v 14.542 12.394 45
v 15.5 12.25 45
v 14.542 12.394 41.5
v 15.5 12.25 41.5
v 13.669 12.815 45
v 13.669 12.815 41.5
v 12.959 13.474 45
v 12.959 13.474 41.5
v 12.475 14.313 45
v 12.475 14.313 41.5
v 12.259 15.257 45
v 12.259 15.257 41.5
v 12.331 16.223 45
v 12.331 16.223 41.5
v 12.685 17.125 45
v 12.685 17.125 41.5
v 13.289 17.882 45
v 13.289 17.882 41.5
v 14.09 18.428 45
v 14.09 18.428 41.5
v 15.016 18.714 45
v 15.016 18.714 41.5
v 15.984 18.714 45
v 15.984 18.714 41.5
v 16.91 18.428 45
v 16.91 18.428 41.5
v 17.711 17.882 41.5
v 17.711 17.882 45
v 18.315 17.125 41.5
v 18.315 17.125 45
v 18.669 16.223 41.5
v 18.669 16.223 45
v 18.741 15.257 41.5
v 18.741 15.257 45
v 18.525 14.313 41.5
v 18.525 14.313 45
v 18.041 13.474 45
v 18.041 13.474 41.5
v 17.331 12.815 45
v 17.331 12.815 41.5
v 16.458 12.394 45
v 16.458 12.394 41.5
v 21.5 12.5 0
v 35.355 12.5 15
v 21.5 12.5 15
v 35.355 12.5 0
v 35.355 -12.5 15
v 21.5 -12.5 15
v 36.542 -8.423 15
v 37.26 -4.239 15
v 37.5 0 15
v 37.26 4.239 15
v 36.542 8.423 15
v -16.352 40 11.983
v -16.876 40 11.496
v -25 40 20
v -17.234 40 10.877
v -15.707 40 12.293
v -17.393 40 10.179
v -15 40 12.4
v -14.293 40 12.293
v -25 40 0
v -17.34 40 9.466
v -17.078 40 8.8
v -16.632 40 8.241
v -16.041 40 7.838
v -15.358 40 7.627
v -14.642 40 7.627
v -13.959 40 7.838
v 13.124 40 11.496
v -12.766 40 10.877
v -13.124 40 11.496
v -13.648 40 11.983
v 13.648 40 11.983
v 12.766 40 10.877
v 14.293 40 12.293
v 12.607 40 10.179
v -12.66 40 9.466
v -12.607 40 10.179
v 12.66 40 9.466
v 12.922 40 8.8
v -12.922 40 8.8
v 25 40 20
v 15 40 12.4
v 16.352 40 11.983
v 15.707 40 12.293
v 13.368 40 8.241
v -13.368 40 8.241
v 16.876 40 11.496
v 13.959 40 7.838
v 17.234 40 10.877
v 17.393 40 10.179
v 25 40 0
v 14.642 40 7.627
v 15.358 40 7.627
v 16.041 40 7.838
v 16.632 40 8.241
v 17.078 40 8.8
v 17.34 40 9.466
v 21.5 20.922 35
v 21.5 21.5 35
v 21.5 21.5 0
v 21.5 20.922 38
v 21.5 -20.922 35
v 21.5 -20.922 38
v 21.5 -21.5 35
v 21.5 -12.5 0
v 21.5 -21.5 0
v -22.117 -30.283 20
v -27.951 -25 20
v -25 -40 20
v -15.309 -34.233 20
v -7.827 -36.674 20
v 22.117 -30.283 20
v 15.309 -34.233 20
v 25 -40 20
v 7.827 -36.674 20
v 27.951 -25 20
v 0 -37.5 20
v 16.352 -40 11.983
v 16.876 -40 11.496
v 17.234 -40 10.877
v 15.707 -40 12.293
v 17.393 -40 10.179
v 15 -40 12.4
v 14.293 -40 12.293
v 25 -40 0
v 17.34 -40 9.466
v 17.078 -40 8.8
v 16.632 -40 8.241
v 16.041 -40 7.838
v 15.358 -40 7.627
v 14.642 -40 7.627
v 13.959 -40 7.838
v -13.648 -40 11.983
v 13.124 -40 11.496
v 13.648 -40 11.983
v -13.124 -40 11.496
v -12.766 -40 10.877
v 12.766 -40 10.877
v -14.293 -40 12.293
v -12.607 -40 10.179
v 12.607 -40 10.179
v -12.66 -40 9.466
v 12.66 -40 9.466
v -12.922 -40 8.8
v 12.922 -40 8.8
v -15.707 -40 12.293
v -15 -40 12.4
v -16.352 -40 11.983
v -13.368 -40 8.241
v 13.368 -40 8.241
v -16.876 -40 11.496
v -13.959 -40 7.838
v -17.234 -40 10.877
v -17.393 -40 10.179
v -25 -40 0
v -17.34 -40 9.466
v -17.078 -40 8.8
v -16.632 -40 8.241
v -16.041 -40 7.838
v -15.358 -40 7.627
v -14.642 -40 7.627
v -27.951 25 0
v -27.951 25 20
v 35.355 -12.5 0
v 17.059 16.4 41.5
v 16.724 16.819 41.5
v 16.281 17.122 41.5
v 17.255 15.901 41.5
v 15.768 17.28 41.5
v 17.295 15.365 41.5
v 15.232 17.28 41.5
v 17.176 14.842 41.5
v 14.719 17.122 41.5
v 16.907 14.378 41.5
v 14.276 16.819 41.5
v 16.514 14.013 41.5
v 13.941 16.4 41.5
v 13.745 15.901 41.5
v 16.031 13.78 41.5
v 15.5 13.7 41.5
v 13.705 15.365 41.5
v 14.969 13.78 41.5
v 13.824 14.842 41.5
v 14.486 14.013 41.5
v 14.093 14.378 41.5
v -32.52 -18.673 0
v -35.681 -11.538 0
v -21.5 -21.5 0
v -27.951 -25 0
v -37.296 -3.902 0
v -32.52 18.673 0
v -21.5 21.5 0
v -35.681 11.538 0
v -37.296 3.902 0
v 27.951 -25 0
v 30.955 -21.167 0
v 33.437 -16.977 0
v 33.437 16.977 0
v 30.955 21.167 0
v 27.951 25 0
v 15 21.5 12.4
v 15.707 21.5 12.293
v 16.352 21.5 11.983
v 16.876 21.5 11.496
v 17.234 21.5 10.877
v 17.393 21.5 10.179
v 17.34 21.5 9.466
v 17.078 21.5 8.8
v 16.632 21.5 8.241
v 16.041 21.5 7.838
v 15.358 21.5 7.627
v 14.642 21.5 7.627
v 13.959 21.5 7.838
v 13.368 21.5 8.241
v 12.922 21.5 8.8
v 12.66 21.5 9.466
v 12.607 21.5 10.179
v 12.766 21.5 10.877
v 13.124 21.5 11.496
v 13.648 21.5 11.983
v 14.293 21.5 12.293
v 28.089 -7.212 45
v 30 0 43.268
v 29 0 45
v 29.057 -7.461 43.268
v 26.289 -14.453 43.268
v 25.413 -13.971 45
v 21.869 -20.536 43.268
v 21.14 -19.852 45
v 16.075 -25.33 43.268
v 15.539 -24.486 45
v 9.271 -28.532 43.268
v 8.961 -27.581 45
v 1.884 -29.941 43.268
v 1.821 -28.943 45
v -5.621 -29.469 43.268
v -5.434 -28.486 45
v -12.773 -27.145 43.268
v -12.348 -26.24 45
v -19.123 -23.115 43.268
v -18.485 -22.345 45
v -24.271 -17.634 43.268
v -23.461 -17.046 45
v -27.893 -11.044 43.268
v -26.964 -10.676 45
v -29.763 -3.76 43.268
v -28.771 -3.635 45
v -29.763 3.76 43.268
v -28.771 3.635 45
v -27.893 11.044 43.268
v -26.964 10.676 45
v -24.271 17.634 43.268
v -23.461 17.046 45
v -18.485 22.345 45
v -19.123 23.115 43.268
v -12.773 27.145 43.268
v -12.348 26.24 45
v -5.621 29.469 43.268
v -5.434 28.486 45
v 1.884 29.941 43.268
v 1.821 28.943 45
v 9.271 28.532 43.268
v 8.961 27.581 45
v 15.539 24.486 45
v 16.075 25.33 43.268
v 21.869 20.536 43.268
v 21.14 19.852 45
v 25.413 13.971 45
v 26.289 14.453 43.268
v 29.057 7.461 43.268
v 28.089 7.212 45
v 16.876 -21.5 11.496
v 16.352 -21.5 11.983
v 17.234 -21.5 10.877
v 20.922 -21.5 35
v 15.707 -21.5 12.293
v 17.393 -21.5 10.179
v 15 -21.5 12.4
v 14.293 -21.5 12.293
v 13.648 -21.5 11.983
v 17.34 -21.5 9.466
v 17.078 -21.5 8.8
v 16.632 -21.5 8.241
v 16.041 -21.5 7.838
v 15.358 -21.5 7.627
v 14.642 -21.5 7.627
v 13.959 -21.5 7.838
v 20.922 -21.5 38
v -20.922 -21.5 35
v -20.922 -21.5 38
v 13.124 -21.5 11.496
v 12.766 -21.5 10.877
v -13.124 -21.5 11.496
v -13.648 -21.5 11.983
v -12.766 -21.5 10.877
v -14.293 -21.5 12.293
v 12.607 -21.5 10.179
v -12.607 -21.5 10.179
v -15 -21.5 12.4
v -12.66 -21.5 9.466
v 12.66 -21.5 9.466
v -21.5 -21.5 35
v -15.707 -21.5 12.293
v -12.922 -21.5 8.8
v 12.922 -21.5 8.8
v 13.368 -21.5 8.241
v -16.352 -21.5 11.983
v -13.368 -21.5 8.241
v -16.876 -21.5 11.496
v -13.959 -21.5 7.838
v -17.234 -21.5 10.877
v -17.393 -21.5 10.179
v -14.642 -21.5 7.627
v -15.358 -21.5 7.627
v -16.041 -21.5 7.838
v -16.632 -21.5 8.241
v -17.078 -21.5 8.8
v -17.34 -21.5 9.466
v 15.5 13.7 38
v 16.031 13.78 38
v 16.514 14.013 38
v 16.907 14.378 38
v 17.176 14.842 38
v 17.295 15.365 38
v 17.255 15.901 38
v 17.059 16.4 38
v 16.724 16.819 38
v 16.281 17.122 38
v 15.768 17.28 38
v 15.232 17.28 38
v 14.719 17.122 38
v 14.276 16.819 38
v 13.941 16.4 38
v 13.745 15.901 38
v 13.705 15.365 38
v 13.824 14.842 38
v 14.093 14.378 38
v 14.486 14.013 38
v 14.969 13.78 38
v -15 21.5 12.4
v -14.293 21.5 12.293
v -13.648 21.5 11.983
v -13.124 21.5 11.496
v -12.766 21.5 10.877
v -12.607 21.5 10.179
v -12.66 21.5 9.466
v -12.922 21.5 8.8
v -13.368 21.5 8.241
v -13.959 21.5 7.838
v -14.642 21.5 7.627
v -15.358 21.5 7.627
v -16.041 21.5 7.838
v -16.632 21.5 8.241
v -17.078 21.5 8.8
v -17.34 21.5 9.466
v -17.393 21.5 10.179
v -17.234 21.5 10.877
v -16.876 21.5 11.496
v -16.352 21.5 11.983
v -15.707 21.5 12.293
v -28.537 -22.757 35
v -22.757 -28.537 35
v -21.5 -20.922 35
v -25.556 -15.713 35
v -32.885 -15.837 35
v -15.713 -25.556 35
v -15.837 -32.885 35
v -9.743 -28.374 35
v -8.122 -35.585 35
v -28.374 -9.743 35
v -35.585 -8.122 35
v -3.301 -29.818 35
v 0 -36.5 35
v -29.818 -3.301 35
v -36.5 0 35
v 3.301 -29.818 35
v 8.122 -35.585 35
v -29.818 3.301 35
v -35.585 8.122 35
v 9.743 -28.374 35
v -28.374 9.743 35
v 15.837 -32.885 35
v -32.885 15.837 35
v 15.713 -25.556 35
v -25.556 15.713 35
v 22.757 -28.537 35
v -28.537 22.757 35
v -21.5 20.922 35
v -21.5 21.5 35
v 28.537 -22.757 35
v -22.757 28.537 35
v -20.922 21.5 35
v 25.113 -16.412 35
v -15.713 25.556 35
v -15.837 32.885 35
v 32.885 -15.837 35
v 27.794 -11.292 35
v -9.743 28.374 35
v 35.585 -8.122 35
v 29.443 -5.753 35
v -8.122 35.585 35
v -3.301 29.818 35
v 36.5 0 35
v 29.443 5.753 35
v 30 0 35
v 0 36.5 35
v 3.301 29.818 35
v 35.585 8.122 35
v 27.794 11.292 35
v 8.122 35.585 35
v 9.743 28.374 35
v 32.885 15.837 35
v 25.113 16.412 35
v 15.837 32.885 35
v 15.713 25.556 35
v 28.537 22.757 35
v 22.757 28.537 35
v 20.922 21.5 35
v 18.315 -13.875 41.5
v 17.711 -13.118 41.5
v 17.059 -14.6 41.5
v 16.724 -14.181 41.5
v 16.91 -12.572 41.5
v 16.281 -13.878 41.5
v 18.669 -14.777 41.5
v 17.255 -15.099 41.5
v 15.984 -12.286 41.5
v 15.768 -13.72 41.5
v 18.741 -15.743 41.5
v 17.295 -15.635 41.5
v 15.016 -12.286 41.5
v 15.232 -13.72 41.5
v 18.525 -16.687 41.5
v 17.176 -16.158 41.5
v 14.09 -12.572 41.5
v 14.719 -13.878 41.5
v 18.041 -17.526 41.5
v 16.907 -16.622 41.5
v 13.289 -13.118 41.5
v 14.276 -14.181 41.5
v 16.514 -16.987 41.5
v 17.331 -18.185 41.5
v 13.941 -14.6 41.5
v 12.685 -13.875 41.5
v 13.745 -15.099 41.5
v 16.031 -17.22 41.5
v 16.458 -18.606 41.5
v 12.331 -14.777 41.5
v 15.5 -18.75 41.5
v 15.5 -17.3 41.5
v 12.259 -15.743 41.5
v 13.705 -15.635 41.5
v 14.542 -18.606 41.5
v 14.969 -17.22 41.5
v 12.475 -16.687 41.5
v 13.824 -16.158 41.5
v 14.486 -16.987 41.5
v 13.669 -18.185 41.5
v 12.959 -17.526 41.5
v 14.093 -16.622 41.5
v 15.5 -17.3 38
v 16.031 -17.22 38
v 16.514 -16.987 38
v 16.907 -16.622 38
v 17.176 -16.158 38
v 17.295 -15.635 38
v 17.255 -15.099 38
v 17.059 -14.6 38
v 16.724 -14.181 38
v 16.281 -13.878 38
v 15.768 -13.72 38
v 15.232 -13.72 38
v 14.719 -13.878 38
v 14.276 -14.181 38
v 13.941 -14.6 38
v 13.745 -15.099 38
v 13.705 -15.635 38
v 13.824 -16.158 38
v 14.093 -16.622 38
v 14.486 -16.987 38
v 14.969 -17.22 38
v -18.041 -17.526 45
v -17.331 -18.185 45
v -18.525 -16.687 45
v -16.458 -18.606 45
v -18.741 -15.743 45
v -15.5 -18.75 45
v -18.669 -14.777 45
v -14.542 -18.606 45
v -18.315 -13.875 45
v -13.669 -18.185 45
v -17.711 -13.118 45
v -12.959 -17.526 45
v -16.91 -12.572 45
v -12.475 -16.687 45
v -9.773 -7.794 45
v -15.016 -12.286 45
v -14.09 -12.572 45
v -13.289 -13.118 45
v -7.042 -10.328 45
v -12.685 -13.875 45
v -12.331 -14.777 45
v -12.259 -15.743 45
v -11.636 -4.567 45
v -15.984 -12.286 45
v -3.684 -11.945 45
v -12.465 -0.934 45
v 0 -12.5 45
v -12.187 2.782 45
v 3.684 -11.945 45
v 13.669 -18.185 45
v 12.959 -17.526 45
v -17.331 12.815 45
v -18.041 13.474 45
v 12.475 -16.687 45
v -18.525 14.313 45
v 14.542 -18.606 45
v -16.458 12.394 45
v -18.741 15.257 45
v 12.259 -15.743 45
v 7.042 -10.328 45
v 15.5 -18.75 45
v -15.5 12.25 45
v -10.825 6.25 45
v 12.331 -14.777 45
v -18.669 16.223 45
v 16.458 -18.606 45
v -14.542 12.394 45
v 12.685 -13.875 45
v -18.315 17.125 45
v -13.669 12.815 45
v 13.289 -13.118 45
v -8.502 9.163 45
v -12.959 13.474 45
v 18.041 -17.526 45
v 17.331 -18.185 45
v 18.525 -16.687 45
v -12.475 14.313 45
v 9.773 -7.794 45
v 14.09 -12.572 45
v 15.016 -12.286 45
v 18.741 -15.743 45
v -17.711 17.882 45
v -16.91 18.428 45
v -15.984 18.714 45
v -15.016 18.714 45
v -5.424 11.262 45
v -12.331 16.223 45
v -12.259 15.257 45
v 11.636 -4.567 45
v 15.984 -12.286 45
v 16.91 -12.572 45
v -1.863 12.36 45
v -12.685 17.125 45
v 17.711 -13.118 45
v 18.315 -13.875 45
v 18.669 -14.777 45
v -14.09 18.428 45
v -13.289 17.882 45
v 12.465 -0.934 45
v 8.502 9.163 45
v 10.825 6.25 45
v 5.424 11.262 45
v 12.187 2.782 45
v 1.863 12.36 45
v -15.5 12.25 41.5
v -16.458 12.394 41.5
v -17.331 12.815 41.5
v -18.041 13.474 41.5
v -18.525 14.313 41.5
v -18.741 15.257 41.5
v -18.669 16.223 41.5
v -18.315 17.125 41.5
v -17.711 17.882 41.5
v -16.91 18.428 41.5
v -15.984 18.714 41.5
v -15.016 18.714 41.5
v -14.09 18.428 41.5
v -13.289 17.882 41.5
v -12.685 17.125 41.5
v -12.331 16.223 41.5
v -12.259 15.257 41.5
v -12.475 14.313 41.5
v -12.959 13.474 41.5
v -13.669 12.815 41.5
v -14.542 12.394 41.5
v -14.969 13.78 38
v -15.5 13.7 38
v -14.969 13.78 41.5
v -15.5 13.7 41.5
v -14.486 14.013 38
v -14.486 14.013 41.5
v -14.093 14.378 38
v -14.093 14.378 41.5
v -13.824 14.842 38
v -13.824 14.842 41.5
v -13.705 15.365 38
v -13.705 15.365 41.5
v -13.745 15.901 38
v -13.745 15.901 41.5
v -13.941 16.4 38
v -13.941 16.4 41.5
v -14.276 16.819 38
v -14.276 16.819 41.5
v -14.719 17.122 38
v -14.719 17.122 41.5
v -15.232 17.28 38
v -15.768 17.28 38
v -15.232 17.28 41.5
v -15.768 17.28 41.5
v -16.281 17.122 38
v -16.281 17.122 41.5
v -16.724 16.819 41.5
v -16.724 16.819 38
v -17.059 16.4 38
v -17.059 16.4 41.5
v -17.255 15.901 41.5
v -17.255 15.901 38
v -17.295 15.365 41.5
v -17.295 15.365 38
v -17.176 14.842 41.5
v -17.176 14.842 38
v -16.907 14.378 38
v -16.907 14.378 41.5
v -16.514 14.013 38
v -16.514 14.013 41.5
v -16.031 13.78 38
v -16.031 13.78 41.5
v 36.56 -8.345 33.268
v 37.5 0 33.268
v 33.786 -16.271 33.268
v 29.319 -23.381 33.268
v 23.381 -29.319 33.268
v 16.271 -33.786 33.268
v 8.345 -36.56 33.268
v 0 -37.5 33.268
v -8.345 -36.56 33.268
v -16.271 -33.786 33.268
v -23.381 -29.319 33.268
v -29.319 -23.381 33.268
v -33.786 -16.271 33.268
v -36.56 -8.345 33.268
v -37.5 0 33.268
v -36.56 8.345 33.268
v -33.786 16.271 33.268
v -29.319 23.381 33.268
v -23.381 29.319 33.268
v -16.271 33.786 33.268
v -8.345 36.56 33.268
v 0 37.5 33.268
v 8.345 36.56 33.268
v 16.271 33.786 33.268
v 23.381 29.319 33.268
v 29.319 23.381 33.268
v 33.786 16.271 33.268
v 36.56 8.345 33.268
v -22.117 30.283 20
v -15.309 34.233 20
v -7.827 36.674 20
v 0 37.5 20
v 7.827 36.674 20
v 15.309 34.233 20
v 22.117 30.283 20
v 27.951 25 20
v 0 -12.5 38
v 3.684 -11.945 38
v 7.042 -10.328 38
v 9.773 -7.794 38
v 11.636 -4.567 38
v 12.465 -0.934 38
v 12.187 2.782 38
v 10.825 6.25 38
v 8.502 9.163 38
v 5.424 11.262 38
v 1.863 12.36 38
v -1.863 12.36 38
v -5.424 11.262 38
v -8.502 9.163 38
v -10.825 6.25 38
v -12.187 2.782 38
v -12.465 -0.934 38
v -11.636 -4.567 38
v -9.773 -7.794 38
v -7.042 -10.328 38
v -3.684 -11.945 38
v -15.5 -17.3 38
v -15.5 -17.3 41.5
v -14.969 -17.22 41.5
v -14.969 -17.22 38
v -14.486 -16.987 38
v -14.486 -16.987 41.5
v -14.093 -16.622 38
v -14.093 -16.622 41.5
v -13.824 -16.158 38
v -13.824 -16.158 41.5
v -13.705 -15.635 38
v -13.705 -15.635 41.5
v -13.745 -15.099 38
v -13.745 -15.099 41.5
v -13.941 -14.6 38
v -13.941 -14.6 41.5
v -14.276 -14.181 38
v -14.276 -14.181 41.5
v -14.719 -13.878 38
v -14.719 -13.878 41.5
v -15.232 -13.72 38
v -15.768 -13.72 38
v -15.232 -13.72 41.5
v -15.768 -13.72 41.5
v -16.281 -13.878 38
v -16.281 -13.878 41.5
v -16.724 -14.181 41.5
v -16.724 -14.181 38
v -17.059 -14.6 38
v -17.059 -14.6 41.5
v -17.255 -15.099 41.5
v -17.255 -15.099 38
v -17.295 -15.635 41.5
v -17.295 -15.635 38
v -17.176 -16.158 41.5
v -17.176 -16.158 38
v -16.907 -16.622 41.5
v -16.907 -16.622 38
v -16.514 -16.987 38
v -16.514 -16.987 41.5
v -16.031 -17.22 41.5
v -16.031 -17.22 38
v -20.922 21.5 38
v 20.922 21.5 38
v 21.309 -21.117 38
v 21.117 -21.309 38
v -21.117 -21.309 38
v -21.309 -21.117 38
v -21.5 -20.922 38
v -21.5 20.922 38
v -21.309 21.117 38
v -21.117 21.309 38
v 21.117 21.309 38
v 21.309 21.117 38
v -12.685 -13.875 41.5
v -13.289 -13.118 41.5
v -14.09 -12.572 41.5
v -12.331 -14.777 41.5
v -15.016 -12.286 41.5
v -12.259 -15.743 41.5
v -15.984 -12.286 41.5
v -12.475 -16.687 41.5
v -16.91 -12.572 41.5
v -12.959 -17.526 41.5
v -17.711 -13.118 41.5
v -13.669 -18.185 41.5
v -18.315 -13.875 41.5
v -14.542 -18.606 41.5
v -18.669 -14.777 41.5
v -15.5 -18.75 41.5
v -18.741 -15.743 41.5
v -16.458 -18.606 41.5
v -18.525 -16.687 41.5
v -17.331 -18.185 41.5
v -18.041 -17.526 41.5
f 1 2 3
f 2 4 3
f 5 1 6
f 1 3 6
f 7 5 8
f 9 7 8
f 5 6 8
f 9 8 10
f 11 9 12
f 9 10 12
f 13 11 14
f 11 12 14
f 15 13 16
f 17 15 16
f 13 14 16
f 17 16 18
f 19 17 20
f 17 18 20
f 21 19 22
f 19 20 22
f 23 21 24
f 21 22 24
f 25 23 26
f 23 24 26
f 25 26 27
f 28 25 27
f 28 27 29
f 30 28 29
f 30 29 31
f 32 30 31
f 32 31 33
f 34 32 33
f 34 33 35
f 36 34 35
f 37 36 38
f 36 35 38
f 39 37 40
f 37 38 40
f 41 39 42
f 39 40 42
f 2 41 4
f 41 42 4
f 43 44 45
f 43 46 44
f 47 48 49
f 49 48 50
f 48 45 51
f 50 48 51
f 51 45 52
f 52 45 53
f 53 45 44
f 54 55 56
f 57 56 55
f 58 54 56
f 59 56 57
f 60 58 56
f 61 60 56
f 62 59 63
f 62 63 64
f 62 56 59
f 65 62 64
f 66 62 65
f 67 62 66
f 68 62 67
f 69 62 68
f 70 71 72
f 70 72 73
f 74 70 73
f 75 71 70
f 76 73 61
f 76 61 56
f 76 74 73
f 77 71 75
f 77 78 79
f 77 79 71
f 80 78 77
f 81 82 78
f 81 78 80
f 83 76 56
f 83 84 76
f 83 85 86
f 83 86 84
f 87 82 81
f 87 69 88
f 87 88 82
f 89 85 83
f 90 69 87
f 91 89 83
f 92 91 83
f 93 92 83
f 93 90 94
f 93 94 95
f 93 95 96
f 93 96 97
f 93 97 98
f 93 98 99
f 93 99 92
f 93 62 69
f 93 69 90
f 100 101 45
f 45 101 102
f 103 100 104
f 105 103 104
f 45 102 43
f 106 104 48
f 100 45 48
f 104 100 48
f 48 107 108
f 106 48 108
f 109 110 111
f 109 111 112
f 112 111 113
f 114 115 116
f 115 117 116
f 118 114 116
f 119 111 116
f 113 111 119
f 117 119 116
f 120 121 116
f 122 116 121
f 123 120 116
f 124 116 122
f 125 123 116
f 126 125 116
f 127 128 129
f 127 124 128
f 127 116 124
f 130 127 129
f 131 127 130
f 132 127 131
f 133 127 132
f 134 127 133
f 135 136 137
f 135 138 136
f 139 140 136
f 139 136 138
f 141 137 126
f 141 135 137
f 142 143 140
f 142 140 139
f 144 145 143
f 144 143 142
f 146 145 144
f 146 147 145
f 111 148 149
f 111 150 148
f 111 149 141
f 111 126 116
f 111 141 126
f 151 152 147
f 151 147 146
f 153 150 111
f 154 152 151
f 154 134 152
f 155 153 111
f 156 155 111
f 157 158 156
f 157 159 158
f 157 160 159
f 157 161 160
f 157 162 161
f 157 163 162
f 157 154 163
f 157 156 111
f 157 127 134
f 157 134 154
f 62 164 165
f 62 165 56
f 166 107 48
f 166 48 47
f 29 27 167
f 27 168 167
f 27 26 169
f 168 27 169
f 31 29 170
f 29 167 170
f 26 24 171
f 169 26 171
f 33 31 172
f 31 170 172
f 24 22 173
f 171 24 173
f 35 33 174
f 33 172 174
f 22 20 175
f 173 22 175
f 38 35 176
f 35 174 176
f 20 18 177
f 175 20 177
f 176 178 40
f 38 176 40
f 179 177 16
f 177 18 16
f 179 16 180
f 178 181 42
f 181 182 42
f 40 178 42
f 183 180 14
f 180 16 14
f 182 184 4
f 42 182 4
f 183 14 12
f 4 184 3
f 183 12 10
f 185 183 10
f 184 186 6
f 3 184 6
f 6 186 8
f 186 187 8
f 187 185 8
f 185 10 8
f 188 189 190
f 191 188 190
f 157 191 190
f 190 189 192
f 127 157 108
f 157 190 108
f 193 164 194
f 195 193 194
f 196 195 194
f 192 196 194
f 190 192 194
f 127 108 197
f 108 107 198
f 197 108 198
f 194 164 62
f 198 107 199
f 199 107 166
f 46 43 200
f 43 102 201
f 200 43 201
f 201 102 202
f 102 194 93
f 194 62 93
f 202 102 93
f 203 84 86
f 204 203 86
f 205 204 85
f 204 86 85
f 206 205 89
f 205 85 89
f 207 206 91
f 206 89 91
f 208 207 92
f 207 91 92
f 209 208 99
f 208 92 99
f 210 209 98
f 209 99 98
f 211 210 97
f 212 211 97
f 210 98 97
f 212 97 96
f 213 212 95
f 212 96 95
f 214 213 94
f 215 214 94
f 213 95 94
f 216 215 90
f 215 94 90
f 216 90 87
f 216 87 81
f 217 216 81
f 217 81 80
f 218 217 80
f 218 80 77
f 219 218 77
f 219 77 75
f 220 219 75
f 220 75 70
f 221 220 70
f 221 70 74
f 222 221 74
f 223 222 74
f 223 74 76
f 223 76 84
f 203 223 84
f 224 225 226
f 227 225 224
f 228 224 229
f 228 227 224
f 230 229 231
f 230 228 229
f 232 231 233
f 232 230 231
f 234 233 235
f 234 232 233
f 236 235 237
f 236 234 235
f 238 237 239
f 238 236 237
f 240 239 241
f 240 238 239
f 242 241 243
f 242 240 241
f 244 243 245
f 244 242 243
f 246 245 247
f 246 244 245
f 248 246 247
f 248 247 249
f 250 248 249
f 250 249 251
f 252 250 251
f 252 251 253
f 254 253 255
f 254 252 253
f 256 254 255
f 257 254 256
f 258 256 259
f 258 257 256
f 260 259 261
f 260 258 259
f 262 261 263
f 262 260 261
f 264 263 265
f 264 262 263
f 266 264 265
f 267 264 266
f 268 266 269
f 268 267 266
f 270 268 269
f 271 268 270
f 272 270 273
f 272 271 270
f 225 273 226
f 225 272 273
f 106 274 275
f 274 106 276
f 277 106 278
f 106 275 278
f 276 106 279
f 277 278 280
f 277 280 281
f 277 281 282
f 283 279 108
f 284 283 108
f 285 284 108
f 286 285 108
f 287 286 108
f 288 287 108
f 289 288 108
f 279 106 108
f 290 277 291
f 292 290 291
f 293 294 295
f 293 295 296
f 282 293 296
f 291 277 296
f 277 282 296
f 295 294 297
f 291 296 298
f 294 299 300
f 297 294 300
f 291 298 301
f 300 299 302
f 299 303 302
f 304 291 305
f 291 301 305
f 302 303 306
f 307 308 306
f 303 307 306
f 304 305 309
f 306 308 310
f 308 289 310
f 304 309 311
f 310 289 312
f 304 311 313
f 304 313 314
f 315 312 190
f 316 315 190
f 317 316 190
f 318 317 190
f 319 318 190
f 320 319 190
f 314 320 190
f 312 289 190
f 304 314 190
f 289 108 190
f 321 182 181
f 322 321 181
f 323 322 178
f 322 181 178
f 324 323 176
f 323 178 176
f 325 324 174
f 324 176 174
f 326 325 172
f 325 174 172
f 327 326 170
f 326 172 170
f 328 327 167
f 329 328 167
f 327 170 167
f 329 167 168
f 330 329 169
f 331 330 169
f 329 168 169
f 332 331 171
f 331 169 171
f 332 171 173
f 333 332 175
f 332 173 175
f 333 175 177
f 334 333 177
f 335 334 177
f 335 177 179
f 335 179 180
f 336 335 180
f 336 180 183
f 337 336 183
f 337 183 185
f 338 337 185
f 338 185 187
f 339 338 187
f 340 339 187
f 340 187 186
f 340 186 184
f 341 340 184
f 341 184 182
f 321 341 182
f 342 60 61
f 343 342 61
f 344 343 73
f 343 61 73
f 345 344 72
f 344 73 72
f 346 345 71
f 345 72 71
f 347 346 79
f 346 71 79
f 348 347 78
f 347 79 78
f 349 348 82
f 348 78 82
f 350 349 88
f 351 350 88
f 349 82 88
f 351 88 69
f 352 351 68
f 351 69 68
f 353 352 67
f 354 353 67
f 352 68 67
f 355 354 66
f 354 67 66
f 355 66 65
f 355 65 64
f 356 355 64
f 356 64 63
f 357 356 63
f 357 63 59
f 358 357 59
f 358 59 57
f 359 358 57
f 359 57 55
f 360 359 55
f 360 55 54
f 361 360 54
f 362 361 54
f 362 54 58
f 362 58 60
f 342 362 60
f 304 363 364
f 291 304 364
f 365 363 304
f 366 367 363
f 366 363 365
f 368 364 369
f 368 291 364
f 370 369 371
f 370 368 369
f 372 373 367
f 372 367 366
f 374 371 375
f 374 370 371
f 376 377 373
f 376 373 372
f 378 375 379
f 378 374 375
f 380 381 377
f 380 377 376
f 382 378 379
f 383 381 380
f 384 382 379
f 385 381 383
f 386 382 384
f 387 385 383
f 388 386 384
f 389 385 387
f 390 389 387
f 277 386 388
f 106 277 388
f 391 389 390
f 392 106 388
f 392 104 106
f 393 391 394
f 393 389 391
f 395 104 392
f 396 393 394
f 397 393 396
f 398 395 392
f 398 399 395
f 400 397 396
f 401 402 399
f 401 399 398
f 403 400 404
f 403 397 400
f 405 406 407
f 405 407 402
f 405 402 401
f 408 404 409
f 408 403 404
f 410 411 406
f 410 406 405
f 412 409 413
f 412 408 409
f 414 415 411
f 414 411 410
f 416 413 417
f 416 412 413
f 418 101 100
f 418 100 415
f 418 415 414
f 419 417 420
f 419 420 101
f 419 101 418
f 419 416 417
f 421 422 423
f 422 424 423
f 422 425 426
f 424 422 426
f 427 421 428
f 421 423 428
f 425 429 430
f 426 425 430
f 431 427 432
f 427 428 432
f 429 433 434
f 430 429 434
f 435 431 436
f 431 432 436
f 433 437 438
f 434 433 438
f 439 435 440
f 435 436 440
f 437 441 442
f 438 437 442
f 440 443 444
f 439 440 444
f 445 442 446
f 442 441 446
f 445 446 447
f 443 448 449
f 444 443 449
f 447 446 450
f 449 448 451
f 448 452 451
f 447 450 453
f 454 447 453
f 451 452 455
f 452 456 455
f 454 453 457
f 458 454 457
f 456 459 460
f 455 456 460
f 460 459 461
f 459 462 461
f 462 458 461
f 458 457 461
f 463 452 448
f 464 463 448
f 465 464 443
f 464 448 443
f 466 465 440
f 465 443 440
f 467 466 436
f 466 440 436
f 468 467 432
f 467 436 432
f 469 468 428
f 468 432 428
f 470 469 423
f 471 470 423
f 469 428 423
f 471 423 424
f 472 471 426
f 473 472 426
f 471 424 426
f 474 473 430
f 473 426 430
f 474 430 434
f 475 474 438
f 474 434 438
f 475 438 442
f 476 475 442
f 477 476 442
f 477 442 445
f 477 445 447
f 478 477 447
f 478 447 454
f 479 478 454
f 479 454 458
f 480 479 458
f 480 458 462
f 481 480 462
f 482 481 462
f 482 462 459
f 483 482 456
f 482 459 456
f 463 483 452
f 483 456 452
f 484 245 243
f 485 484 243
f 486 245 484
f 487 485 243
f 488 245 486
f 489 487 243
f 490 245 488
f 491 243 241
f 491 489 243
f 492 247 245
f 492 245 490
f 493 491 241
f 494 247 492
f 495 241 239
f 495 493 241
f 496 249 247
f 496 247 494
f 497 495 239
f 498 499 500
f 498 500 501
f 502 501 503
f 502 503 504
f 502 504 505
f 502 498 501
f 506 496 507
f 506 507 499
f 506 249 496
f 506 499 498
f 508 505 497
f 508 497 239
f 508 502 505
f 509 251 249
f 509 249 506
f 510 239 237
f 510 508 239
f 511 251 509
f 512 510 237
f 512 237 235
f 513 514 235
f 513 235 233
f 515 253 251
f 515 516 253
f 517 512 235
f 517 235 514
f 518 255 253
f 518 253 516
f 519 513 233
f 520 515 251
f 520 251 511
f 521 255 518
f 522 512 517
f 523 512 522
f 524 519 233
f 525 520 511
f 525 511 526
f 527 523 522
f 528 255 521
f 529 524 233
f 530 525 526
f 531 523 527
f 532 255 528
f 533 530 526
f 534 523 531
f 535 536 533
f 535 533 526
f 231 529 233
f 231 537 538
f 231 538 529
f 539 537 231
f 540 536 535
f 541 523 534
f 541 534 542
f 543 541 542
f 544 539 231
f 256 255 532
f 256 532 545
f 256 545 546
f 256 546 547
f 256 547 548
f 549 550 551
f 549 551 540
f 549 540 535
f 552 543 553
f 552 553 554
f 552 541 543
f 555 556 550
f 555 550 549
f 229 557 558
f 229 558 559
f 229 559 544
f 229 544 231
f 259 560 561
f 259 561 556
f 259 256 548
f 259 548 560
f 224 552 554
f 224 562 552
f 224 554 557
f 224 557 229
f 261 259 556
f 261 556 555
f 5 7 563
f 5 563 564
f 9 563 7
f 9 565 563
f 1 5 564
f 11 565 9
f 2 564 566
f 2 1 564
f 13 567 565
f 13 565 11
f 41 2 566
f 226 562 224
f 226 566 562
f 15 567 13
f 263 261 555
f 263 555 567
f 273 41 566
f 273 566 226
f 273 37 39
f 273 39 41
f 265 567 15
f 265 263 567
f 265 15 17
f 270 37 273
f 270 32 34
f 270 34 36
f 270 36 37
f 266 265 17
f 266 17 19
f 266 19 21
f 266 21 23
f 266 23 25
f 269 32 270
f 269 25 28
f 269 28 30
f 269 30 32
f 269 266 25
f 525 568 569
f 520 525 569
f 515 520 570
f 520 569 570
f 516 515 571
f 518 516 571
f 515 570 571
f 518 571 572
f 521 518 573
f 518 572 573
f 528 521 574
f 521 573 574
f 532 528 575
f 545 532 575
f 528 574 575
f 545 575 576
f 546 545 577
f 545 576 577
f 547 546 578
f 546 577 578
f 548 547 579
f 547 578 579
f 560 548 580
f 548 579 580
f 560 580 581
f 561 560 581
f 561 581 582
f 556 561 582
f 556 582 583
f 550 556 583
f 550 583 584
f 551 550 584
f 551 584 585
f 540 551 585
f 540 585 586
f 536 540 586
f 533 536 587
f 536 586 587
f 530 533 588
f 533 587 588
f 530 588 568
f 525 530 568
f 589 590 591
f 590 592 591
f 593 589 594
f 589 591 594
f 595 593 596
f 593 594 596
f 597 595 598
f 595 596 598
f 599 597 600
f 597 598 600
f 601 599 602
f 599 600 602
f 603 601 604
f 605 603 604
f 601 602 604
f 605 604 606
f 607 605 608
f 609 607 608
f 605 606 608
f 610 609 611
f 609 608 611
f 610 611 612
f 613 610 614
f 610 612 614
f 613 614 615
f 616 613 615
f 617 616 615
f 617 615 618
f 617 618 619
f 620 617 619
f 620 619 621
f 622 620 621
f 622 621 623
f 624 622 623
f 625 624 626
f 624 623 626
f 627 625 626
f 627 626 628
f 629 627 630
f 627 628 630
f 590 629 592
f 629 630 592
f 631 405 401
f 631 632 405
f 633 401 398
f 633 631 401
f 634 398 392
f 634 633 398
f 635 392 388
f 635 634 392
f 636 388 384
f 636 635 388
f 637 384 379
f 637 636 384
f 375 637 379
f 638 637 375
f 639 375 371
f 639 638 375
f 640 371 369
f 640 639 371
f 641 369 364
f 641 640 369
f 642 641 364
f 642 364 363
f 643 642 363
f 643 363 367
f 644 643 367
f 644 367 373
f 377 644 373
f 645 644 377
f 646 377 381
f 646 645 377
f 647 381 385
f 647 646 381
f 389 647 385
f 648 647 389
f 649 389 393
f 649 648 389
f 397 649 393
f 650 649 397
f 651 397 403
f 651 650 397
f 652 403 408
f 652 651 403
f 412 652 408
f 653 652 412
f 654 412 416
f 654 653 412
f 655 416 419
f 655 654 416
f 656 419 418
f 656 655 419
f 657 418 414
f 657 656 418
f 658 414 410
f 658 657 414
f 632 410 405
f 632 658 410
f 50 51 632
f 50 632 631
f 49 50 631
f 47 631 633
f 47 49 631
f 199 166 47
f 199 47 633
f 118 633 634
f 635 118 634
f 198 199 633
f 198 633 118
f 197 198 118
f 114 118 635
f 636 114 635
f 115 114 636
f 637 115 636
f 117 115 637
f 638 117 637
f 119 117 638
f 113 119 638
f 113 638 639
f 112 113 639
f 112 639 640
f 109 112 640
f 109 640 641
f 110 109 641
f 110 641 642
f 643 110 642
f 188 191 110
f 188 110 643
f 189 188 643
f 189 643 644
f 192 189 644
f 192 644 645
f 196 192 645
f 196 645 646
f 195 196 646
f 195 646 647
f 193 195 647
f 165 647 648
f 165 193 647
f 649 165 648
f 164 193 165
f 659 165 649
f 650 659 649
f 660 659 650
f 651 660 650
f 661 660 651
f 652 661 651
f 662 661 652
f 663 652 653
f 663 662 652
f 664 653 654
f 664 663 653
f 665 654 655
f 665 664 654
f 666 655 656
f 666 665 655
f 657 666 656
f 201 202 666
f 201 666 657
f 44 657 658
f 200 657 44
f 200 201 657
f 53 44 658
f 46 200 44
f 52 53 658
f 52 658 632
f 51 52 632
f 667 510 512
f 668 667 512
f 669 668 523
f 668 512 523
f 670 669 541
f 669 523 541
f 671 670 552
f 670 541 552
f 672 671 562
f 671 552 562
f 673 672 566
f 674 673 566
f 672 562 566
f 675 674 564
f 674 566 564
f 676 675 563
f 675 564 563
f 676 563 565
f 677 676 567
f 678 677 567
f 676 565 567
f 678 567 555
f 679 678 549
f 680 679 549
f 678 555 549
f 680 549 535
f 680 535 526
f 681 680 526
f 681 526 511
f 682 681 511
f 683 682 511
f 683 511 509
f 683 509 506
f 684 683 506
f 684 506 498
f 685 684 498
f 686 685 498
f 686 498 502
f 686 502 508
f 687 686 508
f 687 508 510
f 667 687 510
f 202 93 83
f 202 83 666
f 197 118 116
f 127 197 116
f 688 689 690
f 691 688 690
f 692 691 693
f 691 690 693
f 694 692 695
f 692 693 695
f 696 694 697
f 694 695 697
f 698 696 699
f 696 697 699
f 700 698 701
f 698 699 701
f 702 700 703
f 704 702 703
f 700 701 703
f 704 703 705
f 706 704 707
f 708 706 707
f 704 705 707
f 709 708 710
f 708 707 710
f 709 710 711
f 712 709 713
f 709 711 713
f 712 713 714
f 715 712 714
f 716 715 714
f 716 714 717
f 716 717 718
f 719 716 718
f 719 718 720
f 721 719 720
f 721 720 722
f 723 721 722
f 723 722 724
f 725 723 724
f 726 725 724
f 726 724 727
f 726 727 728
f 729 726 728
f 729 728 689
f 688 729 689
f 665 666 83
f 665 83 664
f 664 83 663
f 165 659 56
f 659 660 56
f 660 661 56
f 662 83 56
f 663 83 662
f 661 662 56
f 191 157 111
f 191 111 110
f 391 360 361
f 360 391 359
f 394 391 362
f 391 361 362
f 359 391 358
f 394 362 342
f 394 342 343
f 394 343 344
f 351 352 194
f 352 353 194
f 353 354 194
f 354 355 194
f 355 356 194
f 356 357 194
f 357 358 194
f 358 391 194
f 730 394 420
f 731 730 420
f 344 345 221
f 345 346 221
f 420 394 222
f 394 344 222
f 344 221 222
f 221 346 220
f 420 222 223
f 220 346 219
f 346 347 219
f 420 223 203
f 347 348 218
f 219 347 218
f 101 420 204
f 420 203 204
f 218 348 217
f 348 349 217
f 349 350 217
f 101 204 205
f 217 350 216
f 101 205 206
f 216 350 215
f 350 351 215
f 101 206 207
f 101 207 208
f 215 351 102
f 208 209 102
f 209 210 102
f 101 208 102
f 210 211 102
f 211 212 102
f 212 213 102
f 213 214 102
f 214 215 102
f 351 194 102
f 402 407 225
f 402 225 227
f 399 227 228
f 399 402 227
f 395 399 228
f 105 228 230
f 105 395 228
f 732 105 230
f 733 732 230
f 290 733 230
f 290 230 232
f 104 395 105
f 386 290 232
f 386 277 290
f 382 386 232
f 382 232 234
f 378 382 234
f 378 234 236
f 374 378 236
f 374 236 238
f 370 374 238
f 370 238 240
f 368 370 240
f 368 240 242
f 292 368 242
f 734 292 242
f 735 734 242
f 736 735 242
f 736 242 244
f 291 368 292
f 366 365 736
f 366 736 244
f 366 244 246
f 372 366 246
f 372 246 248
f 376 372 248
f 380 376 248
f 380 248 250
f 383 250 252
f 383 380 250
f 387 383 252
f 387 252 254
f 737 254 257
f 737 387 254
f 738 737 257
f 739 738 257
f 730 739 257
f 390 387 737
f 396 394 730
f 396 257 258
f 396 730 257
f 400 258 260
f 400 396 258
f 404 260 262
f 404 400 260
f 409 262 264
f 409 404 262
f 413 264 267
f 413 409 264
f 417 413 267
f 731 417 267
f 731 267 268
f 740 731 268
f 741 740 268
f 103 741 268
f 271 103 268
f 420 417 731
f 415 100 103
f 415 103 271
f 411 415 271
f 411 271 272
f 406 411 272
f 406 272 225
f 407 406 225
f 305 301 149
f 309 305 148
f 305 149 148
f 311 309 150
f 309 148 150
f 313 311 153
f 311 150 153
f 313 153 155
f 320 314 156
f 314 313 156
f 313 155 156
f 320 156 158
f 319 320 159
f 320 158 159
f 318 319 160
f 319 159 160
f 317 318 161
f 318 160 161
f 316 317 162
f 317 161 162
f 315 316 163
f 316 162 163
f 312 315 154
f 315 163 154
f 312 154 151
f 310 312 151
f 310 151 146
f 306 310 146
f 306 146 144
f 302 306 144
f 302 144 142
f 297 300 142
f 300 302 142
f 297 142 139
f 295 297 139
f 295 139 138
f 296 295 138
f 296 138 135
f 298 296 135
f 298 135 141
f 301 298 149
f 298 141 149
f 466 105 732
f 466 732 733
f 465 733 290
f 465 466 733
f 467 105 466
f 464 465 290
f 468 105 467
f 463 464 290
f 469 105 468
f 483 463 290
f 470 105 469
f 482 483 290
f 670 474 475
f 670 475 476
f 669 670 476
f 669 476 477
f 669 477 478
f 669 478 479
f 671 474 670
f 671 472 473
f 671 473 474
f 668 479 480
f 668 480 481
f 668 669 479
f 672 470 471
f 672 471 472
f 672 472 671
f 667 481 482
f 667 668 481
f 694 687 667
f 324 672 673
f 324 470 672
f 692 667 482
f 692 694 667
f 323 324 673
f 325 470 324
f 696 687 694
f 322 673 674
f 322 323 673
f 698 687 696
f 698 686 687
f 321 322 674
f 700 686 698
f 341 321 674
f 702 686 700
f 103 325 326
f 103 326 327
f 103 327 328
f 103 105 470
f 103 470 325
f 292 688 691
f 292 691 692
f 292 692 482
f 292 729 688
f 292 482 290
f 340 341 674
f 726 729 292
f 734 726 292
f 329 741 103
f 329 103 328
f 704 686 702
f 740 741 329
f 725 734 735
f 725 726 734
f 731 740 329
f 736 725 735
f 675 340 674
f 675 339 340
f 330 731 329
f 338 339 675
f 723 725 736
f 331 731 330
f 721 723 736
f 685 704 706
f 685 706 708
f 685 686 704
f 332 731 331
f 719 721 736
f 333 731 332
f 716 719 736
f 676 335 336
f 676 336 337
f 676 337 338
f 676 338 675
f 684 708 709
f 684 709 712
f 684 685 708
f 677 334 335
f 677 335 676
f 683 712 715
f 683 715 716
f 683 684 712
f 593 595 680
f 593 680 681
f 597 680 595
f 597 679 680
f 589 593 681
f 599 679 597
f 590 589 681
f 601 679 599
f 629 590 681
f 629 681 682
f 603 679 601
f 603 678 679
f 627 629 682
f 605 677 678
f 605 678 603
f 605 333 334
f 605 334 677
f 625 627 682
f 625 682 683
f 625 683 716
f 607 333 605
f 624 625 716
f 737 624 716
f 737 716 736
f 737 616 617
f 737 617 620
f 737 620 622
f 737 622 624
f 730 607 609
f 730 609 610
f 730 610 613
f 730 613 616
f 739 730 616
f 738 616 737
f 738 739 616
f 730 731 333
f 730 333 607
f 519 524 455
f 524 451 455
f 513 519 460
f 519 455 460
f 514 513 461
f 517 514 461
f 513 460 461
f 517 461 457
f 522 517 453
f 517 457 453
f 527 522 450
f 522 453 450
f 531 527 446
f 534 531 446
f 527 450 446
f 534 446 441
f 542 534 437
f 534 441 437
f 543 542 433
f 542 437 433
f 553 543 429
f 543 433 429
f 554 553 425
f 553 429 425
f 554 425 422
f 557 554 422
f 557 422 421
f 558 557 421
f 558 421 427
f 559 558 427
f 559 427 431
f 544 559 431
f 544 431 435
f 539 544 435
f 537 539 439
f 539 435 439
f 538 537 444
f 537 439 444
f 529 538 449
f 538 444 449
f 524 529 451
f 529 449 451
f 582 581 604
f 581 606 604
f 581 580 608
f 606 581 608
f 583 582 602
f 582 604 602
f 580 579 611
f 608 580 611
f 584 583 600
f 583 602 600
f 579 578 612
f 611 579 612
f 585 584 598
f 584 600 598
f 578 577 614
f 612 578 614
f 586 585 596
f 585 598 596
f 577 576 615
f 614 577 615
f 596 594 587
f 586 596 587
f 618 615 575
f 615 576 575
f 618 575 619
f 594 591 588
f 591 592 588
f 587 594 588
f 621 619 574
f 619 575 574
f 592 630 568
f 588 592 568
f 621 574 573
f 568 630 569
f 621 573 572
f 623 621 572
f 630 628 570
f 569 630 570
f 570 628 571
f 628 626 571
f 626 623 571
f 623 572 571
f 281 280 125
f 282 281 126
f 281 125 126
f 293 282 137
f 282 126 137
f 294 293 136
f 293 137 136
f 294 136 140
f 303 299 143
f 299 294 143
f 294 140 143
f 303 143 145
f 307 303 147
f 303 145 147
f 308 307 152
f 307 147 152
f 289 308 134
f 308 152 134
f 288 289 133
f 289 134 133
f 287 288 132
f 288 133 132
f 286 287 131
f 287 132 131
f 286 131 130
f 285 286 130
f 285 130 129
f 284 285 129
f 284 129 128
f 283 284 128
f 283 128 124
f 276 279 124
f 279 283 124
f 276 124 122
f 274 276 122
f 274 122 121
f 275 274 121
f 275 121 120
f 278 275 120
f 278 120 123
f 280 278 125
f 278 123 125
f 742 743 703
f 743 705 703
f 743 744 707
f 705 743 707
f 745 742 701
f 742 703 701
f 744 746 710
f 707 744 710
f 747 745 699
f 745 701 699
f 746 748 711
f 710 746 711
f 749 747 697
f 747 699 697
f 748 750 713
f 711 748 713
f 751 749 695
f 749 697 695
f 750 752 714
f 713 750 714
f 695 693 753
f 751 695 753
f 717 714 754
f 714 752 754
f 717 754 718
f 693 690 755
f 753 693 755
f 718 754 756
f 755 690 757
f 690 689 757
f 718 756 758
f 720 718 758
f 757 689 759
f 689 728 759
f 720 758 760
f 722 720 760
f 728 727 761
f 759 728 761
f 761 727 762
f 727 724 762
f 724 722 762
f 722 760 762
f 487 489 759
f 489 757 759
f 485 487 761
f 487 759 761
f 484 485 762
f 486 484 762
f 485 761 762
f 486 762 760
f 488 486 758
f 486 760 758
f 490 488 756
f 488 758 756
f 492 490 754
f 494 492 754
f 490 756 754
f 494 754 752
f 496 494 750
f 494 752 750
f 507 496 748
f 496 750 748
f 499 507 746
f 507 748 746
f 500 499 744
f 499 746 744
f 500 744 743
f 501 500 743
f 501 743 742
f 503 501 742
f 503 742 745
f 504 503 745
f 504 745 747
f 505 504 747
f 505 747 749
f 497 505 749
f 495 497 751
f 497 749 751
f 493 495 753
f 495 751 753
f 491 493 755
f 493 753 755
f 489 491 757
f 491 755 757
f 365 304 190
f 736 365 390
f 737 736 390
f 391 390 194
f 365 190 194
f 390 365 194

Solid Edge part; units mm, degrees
sketch "Sketch1" plane through (0, 0, 0) normal (0, -1, 0) x (1, 0, 0)
  line L0 (0, 45) -> (30, 45)
  line L1 (30, 45) -> (30, 35)
  line L2 (30, 35) -> (37.5, 35)
  line L3 (37.5, 35) -> (37.5, 0)
  line L4 (0, 0) -> (37.5, 0)
  dimension "D1" = 45
  dimension "D2" = 10
revolve "RevolvedProtrusion1" add sketch "Sketch1" angle 360 about axis through (0, 0, 0) along (0, 0, 1)
chamfer "Chamfer_1" distance 1 angle 60 2 edges at (-37.5, 0, 35) (-30, 0, 45) measured on face at (25.75, -24.25, 35) measured on face at (20.6, -19.4, 45)
sketch "Sketch2" plane through (0, 0, 0) normal (0, 0, -1) x (0, 1, 0)
  line L0 (-21.5, -21.5) -> (21.5, -21.5)
  line L1 (21.5, -21.5) -> (21.5, 21.5)
  line L2 (21.5, 21.5) -> (-21.5, 21.5)
  line L3 (-21.5, 21.5) -> (-21.5, -21.5)
  dimension "D1" = 43
extrude "ExtrudedCutout_1" cut sketch "Sketch2" against normal blind 38
hole "Hole_1" at (0, 0, 45) direction (0, 0, -1) diameter 25 end up to next
hole "Hole_2" at (15.5, -15.5, 45) direction (0, 0, -1) diameter 3.6 end up to next counterbore diameter 6.5 counterbore depth 3.5
hole "Hole1" at (15.5, 15.5, 45) direction (0, 0, -1) diameter 3.6 end up to next counterbore diameter 6.5 counterbore depth 3.5
hole "Hole2" at (-15.5, 15.5, 45) direction (0, 0, -1) diameter 3.6 end up to next counterbore diameter 6.5 counterbore depth 3.5
hole "Hole3" at (-15.5, -15.5, 45) direction (0, 0, -1) diameter 3.6 end up to next counterbore diameter 6.5 counterbore depth 3.5
sketch "Sketch3" plane through (0, 0, 0) normal (0, 0, -1) x (-1, 0, 0)
  line L0 (0, 12.5) -> (0, -12.5)
  line L1 (0, -12.5) -> (-50, -12.5)
  line L2 (-50, -12.5) -> (-50, 12.5)
  line L3 (-50, 12.5) -> (0, 12.5)
  dimension "D1" = 25
  dimension "D2" = 50
extrude "ExtrudedCutout_2" cut sketch "Sketch3" against normal blind 15
sketch "Sketch4" plane through (-1.0723, 0, 0) normal (0, 0, -1) x (0, -1, 0)
  line L0 (-40, 23.9277) -> (-40, -26.0723)
  line L1 (-40, -26.0723) -> (-25, -29.0232)
  line L2 (-25, -29.0232) -> (-25, 26.8785)
  line L3 (-25, 26.8785) -> (-40, 23.9277)
  dimension "D1" = 50
  dimension "D2" = 25
  dimension "D3" = 15
extrude "ExtrudedProtrusion_1" add sketch "Sketch4" against normal blind 20
hole "Hole_6" at (-15, 40, 10) direction (0, -1, 0) diameter 4.8 end up to next
hole "Hole4" at (15, 40, 10) direction (0, -1, 0) diameter 4.8 end up to next
mirror "Mirror1" about plane through (0, 0, 0) normal (0, -1, 0) of "ExtrudedProtrusion_1", "Hole_6", "Hole4"
properties material "Polyethylene, low density"
